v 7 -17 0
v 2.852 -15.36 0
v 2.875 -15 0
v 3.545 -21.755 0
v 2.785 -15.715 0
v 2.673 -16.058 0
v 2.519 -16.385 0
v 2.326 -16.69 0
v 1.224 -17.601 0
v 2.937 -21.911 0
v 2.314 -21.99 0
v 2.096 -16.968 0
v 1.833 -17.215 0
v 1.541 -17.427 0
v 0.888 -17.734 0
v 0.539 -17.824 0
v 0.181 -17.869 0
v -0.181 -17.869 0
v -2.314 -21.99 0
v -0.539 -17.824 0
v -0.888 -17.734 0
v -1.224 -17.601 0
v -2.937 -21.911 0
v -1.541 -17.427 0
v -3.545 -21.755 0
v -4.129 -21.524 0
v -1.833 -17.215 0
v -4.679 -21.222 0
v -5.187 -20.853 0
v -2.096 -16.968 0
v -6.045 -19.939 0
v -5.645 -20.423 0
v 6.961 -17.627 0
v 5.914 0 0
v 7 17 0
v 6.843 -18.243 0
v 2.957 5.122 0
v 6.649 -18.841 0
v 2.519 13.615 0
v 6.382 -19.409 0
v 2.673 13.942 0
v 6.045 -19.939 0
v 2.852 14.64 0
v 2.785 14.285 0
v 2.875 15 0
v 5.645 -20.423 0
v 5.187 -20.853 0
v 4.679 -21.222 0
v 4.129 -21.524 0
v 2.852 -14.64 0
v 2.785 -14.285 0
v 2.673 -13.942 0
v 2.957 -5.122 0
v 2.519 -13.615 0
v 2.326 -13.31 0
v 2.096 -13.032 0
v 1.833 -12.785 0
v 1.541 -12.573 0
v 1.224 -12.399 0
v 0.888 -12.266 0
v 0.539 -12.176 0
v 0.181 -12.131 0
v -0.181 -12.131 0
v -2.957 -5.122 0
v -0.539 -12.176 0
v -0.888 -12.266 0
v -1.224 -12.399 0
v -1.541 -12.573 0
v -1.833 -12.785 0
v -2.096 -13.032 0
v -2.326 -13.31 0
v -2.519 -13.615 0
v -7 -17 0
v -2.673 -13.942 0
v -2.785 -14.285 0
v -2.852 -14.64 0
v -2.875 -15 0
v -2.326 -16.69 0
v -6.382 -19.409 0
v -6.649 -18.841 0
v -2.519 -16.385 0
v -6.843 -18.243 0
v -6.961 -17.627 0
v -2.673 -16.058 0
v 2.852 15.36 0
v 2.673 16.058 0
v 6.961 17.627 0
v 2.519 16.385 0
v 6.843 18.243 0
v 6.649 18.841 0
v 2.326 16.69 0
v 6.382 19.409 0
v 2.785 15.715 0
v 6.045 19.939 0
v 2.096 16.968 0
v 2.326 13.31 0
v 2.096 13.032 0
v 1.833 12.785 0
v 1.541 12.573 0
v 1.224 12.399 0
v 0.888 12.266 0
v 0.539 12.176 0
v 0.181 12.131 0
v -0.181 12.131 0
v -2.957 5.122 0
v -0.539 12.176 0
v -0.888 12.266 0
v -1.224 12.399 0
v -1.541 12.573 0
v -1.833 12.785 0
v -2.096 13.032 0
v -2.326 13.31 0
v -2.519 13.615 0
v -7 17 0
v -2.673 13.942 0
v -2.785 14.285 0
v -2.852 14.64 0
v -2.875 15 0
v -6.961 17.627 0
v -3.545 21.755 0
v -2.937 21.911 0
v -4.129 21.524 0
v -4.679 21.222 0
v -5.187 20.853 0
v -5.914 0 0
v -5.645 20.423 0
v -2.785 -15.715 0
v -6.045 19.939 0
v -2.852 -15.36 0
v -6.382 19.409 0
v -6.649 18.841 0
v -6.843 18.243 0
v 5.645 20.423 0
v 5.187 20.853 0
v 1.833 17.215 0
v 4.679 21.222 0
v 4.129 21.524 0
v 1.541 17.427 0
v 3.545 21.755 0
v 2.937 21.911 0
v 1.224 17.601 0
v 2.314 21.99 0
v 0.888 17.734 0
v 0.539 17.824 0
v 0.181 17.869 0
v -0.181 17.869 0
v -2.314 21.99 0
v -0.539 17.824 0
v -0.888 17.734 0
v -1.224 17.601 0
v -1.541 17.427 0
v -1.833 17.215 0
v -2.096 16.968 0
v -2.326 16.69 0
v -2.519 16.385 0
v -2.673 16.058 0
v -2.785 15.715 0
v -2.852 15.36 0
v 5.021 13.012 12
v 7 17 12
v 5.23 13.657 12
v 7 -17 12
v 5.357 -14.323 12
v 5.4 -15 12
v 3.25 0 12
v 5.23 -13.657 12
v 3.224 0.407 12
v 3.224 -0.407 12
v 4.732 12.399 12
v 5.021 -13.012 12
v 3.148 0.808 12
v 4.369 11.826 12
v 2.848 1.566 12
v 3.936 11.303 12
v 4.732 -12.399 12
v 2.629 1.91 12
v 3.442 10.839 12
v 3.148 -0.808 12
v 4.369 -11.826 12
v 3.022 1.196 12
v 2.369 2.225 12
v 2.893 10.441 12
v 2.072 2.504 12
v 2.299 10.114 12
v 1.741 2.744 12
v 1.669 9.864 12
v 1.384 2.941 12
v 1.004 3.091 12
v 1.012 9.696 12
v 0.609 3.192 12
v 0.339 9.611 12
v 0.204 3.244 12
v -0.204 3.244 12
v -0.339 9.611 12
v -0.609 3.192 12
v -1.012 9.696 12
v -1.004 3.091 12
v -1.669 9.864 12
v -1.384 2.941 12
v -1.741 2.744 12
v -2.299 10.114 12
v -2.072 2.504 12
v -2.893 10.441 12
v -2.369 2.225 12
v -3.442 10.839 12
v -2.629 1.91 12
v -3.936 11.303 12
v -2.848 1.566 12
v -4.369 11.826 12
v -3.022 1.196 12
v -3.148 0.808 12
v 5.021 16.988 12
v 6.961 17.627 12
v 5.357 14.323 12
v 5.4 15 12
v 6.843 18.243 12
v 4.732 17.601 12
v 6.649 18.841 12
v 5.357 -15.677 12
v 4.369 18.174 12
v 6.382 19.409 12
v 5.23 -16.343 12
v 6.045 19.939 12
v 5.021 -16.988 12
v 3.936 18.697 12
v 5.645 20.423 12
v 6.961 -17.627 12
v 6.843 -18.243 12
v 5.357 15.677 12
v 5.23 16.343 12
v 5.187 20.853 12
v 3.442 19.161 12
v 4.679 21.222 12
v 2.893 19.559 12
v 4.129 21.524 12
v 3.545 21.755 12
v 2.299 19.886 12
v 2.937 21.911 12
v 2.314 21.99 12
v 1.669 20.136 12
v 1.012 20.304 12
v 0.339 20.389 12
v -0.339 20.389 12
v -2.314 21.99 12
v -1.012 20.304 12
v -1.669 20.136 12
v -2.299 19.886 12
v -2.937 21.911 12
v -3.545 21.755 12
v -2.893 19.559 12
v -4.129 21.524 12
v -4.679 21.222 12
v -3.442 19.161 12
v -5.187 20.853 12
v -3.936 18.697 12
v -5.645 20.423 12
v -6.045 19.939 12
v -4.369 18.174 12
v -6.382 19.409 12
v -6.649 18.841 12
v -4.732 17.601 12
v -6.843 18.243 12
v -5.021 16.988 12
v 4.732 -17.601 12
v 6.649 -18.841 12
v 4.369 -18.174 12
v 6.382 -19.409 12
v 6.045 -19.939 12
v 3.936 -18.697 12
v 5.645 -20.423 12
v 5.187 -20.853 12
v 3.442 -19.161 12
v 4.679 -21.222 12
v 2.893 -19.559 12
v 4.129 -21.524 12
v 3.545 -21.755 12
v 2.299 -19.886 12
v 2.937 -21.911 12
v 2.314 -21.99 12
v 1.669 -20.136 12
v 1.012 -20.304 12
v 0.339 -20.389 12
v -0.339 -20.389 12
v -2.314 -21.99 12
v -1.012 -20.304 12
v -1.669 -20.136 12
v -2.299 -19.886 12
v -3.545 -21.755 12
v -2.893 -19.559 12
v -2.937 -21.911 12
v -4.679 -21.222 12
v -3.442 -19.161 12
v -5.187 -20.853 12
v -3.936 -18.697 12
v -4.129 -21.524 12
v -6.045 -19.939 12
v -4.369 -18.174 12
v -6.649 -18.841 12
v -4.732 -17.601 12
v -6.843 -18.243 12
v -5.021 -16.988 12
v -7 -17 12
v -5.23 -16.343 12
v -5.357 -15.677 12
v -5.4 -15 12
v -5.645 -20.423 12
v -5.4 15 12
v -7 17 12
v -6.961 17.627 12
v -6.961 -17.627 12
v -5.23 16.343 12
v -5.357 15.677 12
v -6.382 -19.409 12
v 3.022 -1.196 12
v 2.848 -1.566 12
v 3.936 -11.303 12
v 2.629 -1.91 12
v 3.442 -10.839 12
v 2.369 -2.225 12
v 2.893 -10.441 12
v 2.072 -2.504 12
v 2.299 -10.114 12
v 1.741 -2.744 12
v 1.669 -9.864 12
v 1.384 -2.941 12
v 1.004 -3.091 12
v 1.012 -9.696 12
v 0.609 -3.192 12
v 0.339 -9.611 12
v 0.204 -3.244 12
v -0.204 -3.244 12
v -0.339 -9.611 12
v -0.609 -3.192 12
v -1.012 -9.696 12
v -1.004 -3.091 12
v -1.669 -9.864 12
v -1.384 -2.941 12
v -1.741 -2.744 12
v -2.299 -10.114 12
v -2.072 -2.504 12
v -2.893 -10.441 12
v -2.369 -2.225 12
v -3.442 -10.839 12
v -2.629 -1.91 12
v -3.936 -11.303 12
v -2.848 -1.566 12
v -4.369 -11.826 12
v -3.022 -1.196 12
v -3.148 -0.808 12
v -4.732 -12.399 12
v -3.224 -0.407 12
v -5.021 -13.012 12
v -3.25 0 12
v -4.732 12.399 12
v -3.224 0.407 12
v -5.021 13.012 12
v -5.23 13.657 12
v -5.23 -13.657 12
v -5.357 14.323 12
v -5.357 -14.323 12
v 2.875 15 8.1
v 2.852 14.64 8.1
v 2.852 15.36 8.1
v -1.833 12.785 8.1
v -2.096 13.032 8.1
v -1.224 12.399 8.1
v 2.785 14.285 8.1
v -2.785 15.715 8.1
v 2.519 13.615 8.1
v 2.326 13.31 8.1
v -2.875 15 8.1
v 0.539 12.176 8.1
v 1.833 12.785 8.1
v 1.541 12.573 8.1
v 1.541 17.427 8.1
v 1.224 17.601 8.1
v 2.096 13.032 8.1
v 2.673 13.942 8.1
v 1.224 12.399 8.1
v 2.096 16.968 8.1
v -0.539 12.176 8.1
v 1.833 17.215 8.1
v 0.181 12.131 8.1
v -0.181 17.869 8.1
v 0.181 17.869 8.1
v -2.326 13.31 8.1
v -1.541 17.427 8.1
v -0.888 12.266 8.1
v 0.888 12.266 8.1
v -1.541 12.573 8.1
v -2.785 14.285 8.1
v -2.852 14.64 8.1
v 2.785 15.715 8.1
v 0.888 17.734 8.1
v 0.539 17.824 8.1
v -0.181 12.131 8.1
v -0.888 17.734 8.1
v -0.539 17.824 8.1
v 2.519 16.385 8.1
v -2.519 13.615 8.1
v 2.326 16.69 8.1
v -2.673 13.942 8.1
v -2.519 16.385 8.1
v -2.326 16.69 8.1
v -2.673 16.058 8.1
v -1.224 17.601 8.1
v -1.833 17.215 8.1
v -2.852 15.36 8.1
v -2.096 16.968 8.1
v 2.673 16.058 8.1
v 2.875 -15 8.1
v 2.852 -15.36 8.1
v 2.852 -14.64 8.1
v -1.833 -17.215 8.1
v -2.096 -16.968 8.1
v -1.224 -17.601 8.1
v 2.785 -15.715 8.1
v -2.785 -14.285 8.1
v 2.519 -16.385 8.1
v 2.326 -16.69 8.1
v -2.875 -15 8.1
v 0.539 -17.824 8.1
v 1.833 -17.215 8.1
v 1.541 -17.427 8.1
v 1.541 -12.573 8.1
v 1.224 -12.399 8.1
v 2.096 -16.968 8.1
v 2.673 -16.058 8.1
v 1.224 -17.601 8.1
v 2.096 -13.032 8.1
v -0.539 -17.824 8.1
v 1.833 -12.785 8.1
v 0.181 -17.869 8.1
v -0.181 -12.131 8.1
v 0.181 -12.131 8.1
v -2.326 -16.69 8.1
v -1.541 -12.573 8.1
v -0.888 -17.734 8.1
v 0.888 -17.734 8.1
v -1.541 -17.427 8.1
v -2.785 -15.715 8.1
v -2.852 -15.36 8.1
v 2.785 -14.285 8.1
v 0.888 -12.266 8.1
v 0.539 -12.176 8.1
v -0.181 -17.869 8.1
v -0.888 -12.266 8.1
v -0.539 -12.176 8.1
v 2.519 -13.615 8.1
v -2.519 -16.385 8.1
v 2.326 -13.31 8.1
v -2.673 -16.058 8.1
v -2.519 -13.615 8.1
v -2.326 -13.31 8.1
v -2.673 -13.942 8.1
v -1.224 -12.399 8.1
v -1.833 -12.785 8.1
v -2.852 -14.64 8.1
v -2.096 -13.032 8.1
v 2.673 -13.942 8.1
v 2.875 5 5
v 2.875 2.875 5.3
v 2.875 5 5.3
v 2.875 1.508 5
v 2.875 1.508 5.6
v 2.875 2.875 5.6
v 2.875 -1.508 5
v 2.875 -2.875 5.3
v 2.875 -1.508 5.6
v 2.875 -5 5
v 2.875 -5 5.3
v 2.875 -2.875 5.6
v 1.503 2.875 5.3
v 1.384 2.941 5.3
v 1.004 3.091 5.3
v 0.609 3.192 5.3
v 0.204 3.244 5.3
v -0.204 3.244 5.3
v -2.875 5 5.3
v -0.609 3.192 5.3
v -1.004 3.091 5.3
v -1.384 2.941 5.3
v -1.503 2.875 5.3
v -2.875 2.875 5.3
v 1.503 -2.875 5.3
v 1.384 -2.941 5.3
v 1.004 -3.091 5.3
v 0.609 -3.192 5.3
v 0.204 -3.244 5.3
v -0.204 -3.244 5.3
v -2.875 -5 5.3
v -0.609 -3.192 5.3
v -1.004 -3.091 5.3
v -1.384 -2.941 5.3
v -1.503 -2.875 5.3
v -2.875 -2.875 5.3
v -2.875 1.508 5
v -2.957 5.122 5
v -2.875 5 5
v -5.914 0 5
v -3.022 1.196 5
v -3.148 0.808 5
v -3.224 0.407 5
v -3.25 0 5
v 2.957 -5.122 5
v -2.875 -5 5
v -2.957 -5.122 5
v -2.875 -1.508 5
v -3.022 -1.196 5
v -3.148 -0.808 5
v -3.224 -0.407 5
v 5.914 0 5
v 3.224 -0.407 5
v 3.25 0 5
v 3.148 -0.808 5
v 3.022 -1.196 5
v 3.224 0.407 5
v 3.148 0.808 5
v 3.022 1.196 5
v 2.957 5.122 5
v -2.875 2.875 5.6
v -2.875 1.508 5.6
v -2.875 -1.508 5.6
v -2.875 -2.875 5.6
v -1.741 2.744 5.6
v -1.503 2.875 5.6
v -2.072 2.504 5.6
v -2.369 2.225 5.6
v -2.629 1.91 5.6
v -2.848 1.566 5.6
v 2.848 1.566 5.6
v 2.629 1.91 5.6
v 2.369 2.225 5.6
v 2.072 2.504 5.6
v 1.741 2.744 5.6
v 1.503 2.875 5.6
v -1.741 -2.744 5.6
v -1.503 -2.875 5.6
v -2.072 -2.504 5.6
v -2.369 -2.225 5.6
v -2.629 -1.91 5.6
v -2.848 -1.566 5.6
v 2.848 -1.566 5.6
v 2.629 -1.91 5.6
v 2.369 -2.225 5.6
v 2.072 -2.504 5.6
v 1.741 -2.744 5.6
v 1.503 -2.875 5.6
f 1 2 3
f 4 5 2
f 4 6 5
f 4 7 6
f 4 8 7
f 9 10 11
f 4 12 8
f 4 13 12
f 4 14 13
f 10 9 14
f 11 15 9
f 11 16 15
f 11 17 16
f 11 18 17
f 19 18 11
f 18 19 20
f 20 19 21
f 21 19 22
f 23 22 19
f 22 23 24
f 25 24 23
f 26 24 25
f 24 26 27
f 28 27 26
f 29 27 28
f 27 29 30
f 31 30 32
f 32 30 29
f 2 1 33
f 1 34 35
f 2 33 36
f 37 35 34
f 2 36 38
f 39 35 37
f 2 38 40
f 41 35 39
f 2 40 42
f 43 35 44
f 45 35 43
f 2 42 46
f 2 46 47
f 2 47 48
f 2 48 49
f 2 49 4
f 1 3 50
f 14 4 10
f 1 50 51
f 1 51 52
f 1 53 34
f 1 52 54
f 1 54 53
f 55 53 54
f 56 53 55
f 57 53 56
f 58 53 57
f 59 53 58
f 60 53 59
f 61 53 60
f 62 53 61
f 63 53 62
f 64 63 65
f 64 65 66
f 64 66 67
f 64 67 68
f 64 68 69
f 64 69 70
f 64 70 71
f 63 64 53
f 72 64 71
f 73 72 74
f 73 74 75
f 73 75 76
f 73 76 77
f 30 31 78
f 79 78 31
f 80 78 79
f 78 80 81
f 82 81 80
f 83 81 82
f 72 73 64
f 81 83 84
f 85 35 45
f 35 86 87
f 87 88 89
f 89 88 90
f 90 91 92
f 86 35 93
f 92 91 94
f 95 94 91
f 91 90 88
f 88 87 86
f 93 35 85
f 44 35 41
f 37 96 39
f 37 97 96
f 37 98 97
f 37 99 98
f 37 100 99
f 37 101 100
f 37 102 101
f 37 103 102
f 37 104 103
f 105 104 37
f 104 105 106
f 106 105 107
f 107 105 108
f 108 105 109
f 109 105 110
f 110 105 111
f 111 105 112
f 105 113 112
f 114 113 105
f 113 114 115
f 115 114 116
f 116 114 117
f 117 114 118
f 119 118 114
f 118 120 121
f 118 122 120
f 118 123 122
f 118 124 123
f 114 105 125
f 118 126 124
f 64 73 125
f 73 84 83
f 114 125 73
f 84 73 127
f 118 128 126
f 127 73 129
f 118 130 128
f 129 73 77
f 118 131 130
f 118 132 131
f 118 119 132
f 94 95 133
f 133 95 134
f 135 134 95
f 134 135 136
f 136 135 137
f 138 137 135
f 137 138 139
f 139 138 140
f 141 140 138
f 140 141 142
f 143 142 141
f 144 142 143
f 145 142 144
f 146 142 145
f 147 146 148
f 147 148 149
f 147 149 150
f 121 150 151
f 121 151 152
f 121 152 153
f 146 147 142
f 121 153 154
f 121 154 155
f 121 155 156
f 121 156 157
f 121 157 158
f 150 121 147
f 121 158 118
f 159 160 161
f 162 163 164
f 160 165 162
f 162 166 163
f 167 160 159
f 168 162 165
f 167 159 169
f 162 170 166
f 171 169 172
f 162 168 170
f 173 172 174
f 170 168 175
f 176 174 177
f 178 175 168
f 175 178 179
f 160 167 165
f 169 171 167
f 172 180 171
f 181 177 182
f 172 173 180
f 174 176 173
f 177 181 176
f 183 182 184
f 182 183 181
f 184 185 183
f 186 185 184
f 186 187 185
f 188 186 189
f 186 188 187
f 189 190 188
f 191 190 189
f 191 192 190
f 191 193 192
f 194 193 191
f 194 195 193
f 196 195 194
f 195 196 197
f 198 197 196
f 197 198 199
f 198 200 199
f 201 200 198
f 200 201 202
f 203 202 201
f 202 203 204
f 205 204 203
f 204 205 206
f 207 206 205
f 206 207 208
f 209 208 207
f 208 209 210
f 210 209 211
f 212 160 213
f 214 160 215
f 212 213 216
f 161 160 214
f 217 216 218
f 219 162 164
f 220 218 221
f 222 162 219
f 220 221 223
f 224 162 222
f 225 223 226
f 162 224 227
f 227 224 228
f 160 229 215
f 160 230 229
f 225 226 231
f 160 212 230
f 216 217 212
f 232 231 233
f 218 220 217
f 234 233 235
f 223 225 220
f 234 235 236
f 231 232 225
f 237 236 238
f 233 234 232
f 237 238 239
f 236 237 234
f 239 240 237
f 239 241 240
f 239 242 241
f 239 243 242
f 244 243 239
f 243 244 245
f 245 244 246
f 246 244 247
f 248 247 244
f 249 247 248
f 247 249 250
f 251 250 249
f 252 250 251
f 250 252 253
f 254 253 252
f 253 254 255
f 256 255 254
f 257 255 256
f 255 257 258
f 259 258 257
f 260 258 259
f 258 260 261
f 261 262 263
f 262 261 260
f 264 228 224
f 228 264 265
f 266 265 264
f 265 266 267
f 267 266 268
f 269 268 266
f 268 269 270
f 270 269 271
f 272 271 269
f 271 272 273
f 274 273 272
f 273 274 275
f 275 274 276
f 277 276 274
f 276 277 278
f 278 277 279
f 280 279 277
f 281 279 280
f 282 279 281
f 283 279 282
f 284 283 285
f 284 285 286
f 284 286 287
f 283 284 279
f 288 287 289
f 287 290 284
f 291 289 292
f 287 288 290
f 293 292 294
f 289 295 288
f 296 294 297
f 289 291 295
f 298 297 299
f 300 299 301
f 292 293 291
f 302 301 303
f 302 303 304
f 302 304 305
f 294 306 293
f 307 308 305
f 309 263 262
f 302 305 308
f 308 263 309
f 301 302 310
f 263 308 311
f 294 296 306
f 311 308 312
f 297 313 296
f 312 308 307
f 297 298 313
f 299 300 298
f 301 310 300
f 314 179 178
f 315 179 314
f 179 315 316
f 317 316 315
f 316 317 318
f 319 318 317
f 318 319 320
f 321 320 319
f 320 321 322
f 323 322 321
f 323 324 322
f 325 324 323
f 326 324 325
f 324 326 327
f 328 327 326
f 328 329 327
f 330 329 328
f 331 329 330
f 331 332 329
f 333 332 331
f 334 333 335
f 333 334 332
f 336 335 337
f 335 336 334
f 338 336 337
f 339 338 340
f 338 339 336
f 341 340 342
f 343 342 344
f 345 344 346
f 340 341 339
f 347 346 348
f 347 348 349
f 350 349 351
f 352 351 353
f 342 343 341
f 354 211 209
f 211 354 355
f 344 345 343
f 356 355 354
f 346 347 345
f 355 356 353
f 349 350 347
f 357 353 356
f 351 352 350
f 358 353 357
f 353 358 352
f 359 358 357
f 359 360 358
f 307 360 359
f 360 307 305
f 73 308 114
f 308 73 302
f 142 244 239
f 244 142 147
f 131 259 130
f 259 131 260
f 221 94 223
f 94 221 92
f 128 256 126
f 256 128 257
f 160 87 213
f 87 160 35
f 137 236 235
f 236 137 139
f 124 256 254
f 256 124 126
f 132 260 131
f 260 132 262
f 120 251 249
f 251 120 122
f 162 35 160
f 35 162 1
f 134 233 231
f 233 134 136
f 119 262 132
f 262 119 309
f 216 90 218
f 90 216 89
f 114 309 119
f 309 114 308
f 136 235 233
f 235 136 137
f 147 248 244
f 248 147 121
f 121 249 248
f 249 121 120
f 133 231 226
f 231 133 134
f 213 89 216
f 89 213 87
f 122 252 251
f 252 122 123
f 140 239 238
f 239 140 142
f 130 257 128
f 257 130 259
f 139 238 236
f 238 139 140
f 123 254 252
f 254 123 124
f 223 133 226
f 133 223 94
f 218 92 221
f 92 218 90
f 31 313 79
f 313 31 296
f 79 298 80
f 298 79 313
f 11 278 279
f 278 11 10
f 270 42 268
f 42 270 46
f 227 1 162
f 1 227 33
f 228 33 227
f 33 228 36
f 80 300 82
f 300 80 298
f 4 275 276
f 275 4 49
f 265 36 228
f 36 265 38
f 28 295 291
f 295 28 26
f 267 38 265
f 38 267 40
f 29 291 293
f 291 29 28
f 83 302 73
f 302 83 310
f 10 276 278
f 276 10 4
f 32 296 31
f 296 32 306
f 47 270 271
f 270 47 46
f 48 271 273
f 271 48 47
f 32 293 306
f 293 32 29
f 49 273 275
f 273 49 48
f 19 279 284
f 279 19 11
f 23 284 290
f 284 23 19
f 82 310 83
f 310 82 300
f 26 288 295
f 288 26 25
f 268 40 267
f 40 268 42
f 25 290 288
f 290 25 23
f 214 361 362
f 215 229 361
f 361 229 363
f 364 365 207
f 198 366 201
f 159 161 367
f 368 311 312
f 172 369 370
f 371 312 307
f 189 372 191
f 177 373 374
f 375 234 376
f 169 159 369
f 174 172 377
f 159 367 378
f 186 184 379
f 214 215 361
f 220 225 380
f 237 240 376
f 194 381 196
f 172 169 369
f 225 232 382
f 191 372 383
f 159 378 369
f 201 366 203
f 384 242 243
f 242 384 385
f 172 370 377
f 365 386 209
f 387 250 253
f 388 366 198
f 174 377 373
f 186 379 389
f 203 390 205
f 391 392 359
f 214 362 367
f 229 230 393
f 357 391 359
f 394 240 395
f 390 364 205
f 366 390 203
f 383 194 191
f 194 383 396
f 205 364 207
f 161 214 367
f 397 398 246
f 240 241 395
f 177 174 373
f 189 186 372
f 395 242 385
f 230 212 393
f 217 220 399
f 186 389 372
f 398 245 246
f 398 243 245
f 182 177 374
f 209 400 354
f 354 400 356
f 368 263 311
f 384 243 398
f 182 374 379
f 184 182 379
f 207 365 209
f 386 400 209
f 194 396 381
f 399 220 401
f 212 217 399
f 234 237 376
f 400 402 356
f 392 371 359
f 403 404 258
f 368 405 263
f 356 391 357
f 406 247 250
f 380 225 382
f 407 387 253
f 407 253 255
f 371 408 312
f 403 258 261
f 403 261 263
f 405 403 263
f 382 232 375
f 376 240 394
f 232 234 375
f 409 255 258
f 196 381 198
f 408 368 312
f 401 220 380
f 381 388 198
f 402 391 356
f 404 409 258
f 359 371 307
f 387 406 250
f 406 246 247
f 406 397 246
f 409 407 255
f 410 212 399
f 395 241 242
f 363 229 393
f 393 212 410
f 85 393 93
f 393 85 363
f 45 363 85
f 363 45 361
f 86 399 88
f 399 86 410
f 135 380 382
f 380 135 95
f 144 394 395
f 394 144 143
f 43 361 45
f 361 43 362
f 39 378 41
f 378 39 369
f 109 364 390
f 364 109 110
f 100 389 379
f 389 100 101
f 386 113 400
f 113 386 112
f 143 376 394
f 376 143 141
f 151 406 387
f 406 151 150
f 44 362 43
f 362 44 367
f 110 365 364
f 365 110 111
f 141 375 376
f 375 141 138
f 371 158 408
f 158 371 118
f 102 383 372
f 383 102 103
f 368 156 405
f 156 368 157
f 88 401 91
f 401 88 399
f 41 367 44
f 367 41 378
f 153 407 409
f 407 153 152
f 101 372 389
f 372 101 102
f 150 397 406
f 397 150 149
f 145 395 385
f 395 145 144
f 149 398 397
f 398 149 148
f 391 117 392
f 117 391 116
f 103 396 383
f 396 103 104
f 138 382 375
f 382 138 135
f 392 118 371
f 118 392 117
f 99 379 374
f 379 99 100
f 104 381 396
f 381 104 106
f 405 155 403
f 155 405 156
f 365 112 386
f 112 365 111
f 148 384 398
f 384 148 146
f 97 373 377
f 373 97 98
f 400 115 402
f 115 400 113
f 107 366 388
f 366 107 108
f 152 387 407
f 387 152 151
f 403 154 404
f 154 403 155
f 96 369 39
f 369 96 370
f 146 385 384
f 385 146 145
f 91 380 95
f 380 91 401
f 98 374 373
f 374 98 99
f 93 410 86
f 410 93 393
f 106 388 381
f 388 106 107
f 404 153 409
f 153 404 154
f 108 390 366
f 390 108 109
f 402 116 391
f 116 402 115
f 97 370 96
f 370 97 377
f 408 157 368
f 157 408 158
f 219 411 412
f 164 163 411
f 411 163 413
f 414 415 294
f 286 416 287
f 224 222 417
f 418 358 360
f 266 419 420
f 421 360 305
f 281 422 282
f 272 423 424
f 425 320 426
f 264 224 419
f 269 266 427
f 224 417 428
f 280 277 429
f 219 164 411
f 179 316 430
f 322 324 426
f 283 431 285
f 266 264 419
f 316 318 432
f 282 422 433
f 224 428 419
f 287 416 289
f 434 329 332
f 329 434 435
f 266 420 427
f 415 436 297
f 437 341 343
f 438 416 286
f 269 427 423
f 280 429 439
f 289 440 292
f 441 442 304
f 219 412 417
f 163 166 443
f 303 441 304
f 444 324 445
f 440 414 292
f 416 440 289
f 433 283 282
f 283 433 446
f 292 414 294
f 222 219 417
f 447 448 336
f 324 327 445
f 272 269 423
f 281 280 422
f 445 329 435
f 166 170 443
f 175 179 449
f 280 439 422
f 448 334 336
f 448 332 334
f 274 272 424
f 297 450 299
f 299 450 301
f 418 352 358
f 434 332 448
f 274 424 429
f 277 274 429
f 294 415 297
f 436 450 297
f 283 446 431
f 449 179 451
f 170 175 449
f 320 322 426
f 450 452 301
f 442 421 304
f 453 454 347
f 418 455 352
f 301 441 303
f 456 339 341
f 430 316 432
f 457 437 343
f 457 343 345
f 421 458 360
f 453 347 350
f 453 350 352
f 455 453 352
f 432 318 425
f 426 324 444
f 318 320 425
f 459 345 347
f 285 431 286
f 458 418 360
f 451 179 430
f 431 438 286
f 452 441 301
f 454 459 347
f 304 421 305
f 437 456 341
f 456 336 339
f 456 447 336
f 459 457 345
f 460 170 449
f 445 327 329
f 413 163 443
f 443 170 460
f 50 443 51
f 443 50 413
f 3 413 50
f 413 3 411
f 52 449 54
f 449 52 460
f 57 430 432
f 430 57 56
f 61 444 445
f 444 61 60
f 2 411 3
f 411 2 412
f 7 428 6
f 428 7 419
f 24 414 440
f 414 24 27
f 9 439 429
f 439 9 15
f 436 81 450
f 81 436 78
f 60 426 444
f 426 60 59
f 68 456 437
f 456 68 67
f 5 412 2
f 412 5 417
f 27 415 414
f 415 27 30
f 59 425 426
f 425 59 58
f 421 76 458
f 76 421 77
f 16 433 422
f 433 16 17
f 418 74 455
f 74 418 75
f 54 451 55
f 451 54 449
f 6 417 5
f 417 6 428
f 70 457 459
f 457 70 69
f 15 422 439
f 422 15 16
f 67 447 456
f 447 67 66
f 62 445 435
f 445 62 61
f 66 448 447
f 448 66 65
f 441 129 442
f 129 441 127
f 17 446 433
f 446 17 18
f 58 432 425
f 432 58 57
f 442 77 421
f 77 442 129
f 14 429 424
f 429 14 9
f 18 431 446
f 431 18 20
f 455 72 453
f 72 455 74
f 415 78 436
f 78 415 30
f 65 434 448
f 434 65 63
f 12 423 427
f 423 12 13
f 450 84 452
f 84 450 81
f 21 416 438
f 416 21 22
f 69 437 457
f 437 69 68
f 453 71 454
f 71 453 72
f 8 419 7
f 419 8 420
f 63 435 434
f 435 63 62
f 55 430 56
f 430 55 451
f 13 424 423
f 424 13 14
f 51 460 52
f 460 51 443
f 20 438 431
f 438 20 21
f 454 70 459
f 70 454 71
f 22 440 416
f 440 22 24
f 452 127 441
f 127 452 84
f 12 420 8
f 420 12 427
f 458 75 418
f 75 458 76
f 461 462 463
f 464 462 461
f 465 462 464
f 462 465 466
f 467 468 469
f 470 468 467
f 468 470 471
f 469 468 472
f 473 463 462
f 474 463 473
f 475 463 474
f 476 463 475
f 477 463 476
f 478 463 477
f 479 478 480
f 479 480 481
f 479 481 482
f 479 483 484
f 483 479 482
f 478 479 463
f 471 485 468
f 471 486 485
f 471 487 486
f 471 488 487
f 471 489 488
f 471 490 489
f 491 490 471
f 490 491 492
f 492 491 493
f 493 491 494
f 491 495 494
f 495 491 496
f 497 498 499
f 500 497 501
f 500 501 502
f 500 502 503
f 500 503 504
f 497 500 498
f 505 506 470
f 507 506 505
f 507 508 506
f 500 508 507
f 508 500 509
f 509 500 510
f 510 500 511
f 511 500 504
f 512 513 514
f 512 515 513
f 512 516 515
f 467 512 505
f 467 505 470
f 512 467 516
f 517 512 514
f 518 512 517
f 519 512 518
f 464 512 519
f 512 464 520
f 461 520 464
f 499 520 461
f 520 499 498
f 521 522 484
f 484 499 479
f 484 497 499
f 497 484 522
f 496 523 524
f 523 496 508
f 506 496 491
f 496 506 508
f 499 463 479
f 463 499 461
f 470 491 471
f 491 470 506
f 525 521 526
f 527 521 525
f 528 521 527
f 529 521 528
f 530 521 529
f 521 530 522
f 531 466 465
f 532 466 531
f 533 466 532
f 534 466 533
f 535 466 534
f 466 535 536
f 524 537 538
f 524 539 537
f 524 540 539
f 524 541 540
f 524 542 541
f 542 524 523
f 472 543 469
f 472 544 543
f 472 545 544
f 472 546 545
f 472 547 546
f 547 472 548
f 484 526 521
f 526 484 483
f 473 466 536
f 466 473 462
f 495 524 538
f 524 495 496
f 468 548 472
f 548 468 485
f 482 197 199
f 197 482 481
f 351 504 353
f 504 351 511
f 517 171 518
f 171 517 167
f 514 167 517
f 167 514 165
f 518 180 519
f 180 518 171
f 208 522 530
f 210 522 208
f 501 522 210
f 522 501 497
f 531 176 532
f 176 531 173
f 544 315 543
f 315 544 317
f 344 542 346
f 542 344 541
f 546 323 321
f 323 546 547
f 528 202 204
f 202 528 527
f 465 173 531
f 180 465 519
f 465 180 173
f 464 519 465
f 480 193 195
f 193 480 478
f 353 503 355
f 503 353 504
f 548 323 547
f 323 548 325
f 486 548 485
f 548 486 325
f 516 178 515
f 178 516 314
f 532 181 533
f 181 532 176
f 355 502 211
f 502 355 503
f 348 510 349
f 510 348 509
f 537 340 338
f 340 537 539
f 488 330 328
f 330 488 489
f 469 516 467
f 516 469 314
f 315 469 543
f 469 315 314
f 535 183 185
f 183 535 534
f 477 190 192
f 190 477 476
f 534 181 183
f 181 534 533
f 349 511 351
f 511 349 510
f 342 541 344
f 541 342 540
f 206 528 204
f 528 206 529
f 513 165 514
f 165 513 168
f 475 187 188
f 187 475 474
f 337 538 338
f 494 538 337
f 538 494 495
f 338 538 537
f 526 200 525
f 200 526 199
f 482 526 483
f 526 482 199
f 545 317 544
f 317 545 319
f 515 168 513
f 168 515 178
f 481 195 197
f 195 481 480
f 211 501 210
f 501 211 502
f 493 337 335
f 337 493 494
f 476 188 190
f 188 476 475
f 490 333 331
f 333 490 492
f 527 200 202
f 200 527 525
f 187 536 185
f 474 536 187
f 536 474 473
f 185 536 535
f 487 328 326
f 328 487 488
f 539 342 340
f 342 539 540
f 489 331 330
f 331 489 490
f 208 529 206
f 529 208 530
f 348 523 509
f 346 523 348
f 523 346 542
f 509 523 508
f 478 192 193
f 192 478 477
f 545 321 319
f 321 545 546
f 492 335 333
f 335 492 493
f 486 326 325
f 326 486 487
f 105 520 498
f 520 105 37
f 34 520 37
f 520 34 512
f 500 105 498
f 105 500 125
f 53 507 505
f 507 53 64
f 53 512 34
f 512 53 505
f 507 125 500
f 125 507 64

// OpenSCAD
$fn = 50;


difference() {
	union() {
		cylinder(h = 12, r = 7.0000000000);
		translate(v = [0.0000000000, 7.5000000000, 0]) {
			hull() {
				translate(v = [-2.0000000000, 9.5000000000, 0]) {
					cylinder(h = 12, r = 5);
				}
				translate(v = [2.0000000000, 9.5000000000, 0]) {
					cylinder(h = 12, r = 5);
				}
				translate(v = [-2.0000000000, -9.5000000000, 0]) {
					cylinder(h = 12, r = 5);
				}
				translate(v = [2.0000000000, -9.5000000000, 0]) {
					cylinder(h = 12, r = 5);
				}
			}
		}
		translate(v = [0.0000000000, 7.5000000000, 0]) {
			hull() {
				translate(v = [-2.0000000000, 9.5000000000, 0]) {
					cylinder(h = 12, r = 5);
				}
				translate(v = [2.0000000000, 9.5000000000, 0]) {
					cylinder(h = 12, r = 5);
				}
				translate(v = [-2.0000000000, -9.5000000000, 0]) {
					cylinder(h = 12, r = 5);
				}
				translate(v = [2.0000000000, -9.5000000000, 0]) {
					cylinder(h = 12, r = 5);
				}
			}
		}
		translate(v = [0.0000000000, -7.5000000000, 0]) {
			hull() {
				translate(v = [-2.0000000000, 9.5000000000, 0]) {
					cylinder(h = 12, r = 5);
				}
				translate(v = [2.0000000000, 9.5000000000, 0]) {
					cylinder(h = 12, r = 5);
				}
				translate(v = [-2.0000000000, -9.5000000000, 0]) {
					cylinder(h = 12, r = 5);
				}
				translate(v = [2.0000000000, -9.5000000000, 0]) {
					cylinder(h = 12, r = 5);
				}
			}
		}
		translate(v = [0.0000000000, -7.5000000000, 0]) {
			hull() {
				translate(v = [-2.0000000000, 9.5000000000, 0]) {
					cylinder(h = 12, r = 5);
				}
				translate(v = [2.0000000000, 9.5000000000, 0]) {
					cylinder(h = 12, r = 5);
				}
				translate(v = [-2.0000000000, -9.5000000000, 0]) {
					cylinder(h = 12, r = 5);
				}
				translate(v = [2.0000000000, -9.5000000000, 0]) {
					cylinder(h = 12, r = 5);
				}
			}
		}
	}
	union() {
		translate(v = [0.0000000000, 15.0000000000, 12]) {
			rotate(a = [0, 0, 0]) {
				difference() {
					union() {
						#translate(v = [0, 0, -12.0000000000]) {
							cylinder(h = 12, r = 2.6000000000);
						}
						#translate(v = [0, 0, -3.9000000000]) {
							cylinder(h = 3.9000000000, r1 = 2.8750000000, r2 = 5.4000000000);
						}
						#translate(v = [0, 0, -12.0000000000]) {
							cylinder(h = 12, r = 2.8750000000);
						}
						#translate(v = [0, 0, -12.0000000000]) {
							cylinder(h = 12, r = 2.6000000000);
						}
					}
					union();
				}
			}
		}
		translate(v = [0.0000000000, 15.0000000000, 12]) {
			rotate(a = [0, 0, 0]) {
				difference() {
					union() {
						#translate(v = [0, 0, -12.0000000000]) {
							cylinder(h = 12, r = 2.6000000000);
						}
						#translate(v = [0, 0, -3.9000000000]) {
							cylinder(h = 3.9000000000, r1 = 2.8750000000, r2 = 5.4000000000);
						}
						#translate(v = [0, 0, -12.0000000000]) {
							cylinder(h = 12, r = 2.8750000000);
						}
						#translate(v = [0, 0, -12.0000000000]) {
							cylinder(h = 12, r = 2.6000000000);
						}
					}
					union();
				}
			}
		}
		translate(v = [0.0000000000, -15.0000000000, 12]) {
			rotate(a = [0, 0, 0]) {
				difference() {
					union() {
						#translate(v = [0, 0, -12.0000000000]) {
							cylinder(h = 12, r = 2.6000000000);
						}
						#translate(v = [0, 0, -3.9000000000]) {
							cylinder(h = 3.9000000000, r1 = 2.8750000000, r2 = 5.4000000000);
						}
						#translate(v = [0, 0, -12.0000000000]) {
							cylinder(h = 12, r = 2.8750000000);
						}
						#translate(v = [0, 0, -12.0000000000]) {
							cylinder(h = 12, r = 2.6000000000);
						}
					}
					union();
				}
			}
		}
		translate(v = [0.0000000000, -15.0000000000, 12]) {
			rotate(a = [0, 0, 0]) {
				difference() {
					union() {
						#translate(v = [0, 0, -12.0000000000]) {
							cylinder(h = 12, r = 2.6000000000);
						}
						#translate(v = [0, 0, -3.9000000000]) {
							cylinder(h = 3.9000000000, r1 = 2.8750000000, r2 = 5.4000000000);
						}
						#translate(v = [0, 0, -12.0000000000]) {
							cylinder(h = 12, r = 2.8750000000);
						}
						#translate(v = [0, 0, -12.0000000000]) {
							cylinder(h = 12, r = 2.6000000000);
						}
					}
					union();
				}
			}
		}
		translate(v = [0.0000000000, 0.0000000000, 0]) {
			rotate(a = [0, 0, 0]) {
				difference() {
					union() {
						#translate(v = [-2.8750000000, -5.0000000000, -0.3000000000]) {
							cube(size = [5.7500000000, 10, 0.3000000000]);
						}
						#translate(v = [-2.8750000000, -2.8750000000, -0.6000000000]) {
							cube(size = [5.7500000000, 5.7500000000, 0.3000000000]);
						}
						#translate(v = [-2.8750000000, -5.0000000000, 5]) {
							cube(size = [5.7500000000, 10, 0.3000000000]);
						}
						#translate(v = [-2.8750000000, -2.8750000000, 5.3000000000]) {
							cube(size = [5.7500000000, 5.7500000000, 0.3000000000]);
						}
						#translate(v = [0, 0, -100.0000000000]) {
							cylinder(h = 200, r = 3.2500000000);
						}
						#linear_extrude(height = 5) {
							polygon(points = [[5.9142500000, 0.0000000000], [2.9571250000, 5.1218907443], [-2.9571250000, 5.1218907443], [-5.9142500000, 0.0000000000], [-2.9571250000, -5.1218907443], [2.9571250000, -5.1218907443]]);
						}
						#translate(v = [-2.8750000000, -5.0000000000, -0.3000000000]) {
							cube(size = [5.7500000000, 10, 0.3000000000]);
						}
						#translate(v = [-2.8750000000, -2.8750000000, -0.6000000000]) {
							cube(size = [5.7500000000, 5.7500000000, 0.3000000000]);
						}
						#translate(v = [-2.8750000000, -5.0000000000, 5]) {
							cube(size = [5.7500000000, 10, 0.3000000000]);
						}
						#translate(v = [-2.8750000000, -2.8750000000, 5.3000000000]) {
							cube(size = [5.7500000000, 5.7500000000, 0.3000000000]);
						}
						#translate(v = [0, 0, -100.0000000000]) {
							cylinder(h = 200, r = 3.2500000000);
						}
						#translate(v = [-2.8750000000, -5.0000000000, -0.3000000000]) {
							cube(size = [5.7500000000, 10, 0.3000000000]);
						}
						#translate(v = [-2.8750000000, -2.8750000000, -0.6000000000]) {
							cube(size = [5.7500000000, 5.7500000000, 0.3000000000]);
						}
						#translate(v = [-2.8750000000, -5.0000000000, 5]) {
							cube(size = [5.7500000000, 10, 0.3000000000]);
						}
						#translate(v = [-2.8750000000, -2.8750000000, 5.3000000000]) {
							cube(size = [5.7500000000, 5.7500000000, 0.3000000000]);
						}
						#translate(v = [0, 0, -100.0000000000]) {
							cylinder(h = 200, r = 3.2500000000);
						}
					}
					union();
				}
			}
		}
		translate(v = [0, 0, -100]) {
			cylinder(h = 200, r = 3.2500000000);
		}
		translate(v = [0, 0, -100]) {
			cylinder(h = 200, r = 1.8000000000);
		}
	}
}
